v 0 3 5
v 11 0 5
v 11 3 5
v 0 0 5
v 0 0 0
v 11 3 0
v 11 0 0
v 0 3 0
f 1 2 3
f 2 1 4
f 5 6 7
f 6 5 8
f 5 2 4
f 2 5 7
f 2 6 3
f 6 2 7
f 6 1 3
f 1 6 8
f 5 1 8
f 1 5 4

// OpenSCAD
// Generated by SolidPython 1.0.1 on 2020-07-29 00:46:55


cube(size = [11, 3, 5]);
/***********************************************
*********      SolidPython code:      **********
************************************************
 
# import packages: SolidPython
from solid import *
from solid.utils import *
from itertools import chain, combinations, permutations


class Resize:

    def __init__(self, scad_file):
        self.scad_file = scad_file
        #self.scad_file = import_scad(scad_file)
        # cone/cylinder param:
        self.r1 = 0
        self.r2 = 0
        self.h = 0
        # rectangular prism param:
        self.w = 0
        self.l = 0
        # ellipse param:
        self.r = 0

    # import OpenScad code (file name corresponds to shape)


    # classify shape + parameters
    def assign(self, param1, param2, param3):
        if self.scad_file == 'cone.scad':
            self.r1 = param1
            self.r2 = param2
            self.h = param3
        elif self.scad_file == 'cylinder.scad':
            self.r1 = param1
            self.r2 = param2
            self.h = param3
        elif self.scad_file == 'rectangularPrism.scad':
            self.h = param1
            self.l = param2
            self.w = param3
        else:
            self.r = param1
            self.h = param2

    # resize parameters
    def iterate(self):
        x = range(3, 20, 2)
        i = 1
        if self.scad_file == 'cone.scad':
            tempList = list(permutations(x, 2))
            for temp in tempList:
                param1 = temp[0]
                param2 = temp[1]
                filepath = 'produced_scad_files/' + 'cone' + str(param1) + '_' + str(param2) + '_' + '.scad'
                scad_render_to_file(cylinder(h=param1, r1=param2, r2=0), filepath)

        elif self.scad_file == 'cylinder.scad':
            tempList = list(permutations(x, 3))
            for temp in tempList:
                param1 = temp[0]
                param2 = temp[1]
                filepath = 'produced_scad_files/' + 'cylinder' + str(param1) + '_' + str(param2) + '_' + '.scad'
                scad_render_to_file(cylinder(h=param1, r1=param2, r2=param2), filepath)

        elif self.scad_file == 'rectangularPrism.scad':
            tempList = list(permutations(x, 3))
            for temp in tempList:
                param1 = temp[0]
                param2 = temp[1]
                param3 = temp[2]
                filepath = 'produced_scad_files/' + 'rectangularPrism' + str(param1) + '_' + str(param2) + '_' + str(
                    param3) + '.scad'
                scad_render_to_file(cube(size=(param1, param2, param3)), filepath)

        elif self.scad_file == 'ellipse.scad':
            tempList = list(permutations(x, 4))
            for temp in tempList:
                param1 = temp[0]
                param2 = temp[1]
                param3 = temp[2]
                param4 = temp[3]
                filepath = 'produced_scad_files/' + 'ellipse' + str(param1) + '_' + str(param2) + '_' + str(param3) + '_' + str(param4) + '.scad'
                scad_render_to_file(scale([param1, param2, param3])(sphere(r=param4)), filepath)

    def render_to_scadfile(self):
        scad_render_to_file(scad, 'example.scad') 
 
************************************************/
